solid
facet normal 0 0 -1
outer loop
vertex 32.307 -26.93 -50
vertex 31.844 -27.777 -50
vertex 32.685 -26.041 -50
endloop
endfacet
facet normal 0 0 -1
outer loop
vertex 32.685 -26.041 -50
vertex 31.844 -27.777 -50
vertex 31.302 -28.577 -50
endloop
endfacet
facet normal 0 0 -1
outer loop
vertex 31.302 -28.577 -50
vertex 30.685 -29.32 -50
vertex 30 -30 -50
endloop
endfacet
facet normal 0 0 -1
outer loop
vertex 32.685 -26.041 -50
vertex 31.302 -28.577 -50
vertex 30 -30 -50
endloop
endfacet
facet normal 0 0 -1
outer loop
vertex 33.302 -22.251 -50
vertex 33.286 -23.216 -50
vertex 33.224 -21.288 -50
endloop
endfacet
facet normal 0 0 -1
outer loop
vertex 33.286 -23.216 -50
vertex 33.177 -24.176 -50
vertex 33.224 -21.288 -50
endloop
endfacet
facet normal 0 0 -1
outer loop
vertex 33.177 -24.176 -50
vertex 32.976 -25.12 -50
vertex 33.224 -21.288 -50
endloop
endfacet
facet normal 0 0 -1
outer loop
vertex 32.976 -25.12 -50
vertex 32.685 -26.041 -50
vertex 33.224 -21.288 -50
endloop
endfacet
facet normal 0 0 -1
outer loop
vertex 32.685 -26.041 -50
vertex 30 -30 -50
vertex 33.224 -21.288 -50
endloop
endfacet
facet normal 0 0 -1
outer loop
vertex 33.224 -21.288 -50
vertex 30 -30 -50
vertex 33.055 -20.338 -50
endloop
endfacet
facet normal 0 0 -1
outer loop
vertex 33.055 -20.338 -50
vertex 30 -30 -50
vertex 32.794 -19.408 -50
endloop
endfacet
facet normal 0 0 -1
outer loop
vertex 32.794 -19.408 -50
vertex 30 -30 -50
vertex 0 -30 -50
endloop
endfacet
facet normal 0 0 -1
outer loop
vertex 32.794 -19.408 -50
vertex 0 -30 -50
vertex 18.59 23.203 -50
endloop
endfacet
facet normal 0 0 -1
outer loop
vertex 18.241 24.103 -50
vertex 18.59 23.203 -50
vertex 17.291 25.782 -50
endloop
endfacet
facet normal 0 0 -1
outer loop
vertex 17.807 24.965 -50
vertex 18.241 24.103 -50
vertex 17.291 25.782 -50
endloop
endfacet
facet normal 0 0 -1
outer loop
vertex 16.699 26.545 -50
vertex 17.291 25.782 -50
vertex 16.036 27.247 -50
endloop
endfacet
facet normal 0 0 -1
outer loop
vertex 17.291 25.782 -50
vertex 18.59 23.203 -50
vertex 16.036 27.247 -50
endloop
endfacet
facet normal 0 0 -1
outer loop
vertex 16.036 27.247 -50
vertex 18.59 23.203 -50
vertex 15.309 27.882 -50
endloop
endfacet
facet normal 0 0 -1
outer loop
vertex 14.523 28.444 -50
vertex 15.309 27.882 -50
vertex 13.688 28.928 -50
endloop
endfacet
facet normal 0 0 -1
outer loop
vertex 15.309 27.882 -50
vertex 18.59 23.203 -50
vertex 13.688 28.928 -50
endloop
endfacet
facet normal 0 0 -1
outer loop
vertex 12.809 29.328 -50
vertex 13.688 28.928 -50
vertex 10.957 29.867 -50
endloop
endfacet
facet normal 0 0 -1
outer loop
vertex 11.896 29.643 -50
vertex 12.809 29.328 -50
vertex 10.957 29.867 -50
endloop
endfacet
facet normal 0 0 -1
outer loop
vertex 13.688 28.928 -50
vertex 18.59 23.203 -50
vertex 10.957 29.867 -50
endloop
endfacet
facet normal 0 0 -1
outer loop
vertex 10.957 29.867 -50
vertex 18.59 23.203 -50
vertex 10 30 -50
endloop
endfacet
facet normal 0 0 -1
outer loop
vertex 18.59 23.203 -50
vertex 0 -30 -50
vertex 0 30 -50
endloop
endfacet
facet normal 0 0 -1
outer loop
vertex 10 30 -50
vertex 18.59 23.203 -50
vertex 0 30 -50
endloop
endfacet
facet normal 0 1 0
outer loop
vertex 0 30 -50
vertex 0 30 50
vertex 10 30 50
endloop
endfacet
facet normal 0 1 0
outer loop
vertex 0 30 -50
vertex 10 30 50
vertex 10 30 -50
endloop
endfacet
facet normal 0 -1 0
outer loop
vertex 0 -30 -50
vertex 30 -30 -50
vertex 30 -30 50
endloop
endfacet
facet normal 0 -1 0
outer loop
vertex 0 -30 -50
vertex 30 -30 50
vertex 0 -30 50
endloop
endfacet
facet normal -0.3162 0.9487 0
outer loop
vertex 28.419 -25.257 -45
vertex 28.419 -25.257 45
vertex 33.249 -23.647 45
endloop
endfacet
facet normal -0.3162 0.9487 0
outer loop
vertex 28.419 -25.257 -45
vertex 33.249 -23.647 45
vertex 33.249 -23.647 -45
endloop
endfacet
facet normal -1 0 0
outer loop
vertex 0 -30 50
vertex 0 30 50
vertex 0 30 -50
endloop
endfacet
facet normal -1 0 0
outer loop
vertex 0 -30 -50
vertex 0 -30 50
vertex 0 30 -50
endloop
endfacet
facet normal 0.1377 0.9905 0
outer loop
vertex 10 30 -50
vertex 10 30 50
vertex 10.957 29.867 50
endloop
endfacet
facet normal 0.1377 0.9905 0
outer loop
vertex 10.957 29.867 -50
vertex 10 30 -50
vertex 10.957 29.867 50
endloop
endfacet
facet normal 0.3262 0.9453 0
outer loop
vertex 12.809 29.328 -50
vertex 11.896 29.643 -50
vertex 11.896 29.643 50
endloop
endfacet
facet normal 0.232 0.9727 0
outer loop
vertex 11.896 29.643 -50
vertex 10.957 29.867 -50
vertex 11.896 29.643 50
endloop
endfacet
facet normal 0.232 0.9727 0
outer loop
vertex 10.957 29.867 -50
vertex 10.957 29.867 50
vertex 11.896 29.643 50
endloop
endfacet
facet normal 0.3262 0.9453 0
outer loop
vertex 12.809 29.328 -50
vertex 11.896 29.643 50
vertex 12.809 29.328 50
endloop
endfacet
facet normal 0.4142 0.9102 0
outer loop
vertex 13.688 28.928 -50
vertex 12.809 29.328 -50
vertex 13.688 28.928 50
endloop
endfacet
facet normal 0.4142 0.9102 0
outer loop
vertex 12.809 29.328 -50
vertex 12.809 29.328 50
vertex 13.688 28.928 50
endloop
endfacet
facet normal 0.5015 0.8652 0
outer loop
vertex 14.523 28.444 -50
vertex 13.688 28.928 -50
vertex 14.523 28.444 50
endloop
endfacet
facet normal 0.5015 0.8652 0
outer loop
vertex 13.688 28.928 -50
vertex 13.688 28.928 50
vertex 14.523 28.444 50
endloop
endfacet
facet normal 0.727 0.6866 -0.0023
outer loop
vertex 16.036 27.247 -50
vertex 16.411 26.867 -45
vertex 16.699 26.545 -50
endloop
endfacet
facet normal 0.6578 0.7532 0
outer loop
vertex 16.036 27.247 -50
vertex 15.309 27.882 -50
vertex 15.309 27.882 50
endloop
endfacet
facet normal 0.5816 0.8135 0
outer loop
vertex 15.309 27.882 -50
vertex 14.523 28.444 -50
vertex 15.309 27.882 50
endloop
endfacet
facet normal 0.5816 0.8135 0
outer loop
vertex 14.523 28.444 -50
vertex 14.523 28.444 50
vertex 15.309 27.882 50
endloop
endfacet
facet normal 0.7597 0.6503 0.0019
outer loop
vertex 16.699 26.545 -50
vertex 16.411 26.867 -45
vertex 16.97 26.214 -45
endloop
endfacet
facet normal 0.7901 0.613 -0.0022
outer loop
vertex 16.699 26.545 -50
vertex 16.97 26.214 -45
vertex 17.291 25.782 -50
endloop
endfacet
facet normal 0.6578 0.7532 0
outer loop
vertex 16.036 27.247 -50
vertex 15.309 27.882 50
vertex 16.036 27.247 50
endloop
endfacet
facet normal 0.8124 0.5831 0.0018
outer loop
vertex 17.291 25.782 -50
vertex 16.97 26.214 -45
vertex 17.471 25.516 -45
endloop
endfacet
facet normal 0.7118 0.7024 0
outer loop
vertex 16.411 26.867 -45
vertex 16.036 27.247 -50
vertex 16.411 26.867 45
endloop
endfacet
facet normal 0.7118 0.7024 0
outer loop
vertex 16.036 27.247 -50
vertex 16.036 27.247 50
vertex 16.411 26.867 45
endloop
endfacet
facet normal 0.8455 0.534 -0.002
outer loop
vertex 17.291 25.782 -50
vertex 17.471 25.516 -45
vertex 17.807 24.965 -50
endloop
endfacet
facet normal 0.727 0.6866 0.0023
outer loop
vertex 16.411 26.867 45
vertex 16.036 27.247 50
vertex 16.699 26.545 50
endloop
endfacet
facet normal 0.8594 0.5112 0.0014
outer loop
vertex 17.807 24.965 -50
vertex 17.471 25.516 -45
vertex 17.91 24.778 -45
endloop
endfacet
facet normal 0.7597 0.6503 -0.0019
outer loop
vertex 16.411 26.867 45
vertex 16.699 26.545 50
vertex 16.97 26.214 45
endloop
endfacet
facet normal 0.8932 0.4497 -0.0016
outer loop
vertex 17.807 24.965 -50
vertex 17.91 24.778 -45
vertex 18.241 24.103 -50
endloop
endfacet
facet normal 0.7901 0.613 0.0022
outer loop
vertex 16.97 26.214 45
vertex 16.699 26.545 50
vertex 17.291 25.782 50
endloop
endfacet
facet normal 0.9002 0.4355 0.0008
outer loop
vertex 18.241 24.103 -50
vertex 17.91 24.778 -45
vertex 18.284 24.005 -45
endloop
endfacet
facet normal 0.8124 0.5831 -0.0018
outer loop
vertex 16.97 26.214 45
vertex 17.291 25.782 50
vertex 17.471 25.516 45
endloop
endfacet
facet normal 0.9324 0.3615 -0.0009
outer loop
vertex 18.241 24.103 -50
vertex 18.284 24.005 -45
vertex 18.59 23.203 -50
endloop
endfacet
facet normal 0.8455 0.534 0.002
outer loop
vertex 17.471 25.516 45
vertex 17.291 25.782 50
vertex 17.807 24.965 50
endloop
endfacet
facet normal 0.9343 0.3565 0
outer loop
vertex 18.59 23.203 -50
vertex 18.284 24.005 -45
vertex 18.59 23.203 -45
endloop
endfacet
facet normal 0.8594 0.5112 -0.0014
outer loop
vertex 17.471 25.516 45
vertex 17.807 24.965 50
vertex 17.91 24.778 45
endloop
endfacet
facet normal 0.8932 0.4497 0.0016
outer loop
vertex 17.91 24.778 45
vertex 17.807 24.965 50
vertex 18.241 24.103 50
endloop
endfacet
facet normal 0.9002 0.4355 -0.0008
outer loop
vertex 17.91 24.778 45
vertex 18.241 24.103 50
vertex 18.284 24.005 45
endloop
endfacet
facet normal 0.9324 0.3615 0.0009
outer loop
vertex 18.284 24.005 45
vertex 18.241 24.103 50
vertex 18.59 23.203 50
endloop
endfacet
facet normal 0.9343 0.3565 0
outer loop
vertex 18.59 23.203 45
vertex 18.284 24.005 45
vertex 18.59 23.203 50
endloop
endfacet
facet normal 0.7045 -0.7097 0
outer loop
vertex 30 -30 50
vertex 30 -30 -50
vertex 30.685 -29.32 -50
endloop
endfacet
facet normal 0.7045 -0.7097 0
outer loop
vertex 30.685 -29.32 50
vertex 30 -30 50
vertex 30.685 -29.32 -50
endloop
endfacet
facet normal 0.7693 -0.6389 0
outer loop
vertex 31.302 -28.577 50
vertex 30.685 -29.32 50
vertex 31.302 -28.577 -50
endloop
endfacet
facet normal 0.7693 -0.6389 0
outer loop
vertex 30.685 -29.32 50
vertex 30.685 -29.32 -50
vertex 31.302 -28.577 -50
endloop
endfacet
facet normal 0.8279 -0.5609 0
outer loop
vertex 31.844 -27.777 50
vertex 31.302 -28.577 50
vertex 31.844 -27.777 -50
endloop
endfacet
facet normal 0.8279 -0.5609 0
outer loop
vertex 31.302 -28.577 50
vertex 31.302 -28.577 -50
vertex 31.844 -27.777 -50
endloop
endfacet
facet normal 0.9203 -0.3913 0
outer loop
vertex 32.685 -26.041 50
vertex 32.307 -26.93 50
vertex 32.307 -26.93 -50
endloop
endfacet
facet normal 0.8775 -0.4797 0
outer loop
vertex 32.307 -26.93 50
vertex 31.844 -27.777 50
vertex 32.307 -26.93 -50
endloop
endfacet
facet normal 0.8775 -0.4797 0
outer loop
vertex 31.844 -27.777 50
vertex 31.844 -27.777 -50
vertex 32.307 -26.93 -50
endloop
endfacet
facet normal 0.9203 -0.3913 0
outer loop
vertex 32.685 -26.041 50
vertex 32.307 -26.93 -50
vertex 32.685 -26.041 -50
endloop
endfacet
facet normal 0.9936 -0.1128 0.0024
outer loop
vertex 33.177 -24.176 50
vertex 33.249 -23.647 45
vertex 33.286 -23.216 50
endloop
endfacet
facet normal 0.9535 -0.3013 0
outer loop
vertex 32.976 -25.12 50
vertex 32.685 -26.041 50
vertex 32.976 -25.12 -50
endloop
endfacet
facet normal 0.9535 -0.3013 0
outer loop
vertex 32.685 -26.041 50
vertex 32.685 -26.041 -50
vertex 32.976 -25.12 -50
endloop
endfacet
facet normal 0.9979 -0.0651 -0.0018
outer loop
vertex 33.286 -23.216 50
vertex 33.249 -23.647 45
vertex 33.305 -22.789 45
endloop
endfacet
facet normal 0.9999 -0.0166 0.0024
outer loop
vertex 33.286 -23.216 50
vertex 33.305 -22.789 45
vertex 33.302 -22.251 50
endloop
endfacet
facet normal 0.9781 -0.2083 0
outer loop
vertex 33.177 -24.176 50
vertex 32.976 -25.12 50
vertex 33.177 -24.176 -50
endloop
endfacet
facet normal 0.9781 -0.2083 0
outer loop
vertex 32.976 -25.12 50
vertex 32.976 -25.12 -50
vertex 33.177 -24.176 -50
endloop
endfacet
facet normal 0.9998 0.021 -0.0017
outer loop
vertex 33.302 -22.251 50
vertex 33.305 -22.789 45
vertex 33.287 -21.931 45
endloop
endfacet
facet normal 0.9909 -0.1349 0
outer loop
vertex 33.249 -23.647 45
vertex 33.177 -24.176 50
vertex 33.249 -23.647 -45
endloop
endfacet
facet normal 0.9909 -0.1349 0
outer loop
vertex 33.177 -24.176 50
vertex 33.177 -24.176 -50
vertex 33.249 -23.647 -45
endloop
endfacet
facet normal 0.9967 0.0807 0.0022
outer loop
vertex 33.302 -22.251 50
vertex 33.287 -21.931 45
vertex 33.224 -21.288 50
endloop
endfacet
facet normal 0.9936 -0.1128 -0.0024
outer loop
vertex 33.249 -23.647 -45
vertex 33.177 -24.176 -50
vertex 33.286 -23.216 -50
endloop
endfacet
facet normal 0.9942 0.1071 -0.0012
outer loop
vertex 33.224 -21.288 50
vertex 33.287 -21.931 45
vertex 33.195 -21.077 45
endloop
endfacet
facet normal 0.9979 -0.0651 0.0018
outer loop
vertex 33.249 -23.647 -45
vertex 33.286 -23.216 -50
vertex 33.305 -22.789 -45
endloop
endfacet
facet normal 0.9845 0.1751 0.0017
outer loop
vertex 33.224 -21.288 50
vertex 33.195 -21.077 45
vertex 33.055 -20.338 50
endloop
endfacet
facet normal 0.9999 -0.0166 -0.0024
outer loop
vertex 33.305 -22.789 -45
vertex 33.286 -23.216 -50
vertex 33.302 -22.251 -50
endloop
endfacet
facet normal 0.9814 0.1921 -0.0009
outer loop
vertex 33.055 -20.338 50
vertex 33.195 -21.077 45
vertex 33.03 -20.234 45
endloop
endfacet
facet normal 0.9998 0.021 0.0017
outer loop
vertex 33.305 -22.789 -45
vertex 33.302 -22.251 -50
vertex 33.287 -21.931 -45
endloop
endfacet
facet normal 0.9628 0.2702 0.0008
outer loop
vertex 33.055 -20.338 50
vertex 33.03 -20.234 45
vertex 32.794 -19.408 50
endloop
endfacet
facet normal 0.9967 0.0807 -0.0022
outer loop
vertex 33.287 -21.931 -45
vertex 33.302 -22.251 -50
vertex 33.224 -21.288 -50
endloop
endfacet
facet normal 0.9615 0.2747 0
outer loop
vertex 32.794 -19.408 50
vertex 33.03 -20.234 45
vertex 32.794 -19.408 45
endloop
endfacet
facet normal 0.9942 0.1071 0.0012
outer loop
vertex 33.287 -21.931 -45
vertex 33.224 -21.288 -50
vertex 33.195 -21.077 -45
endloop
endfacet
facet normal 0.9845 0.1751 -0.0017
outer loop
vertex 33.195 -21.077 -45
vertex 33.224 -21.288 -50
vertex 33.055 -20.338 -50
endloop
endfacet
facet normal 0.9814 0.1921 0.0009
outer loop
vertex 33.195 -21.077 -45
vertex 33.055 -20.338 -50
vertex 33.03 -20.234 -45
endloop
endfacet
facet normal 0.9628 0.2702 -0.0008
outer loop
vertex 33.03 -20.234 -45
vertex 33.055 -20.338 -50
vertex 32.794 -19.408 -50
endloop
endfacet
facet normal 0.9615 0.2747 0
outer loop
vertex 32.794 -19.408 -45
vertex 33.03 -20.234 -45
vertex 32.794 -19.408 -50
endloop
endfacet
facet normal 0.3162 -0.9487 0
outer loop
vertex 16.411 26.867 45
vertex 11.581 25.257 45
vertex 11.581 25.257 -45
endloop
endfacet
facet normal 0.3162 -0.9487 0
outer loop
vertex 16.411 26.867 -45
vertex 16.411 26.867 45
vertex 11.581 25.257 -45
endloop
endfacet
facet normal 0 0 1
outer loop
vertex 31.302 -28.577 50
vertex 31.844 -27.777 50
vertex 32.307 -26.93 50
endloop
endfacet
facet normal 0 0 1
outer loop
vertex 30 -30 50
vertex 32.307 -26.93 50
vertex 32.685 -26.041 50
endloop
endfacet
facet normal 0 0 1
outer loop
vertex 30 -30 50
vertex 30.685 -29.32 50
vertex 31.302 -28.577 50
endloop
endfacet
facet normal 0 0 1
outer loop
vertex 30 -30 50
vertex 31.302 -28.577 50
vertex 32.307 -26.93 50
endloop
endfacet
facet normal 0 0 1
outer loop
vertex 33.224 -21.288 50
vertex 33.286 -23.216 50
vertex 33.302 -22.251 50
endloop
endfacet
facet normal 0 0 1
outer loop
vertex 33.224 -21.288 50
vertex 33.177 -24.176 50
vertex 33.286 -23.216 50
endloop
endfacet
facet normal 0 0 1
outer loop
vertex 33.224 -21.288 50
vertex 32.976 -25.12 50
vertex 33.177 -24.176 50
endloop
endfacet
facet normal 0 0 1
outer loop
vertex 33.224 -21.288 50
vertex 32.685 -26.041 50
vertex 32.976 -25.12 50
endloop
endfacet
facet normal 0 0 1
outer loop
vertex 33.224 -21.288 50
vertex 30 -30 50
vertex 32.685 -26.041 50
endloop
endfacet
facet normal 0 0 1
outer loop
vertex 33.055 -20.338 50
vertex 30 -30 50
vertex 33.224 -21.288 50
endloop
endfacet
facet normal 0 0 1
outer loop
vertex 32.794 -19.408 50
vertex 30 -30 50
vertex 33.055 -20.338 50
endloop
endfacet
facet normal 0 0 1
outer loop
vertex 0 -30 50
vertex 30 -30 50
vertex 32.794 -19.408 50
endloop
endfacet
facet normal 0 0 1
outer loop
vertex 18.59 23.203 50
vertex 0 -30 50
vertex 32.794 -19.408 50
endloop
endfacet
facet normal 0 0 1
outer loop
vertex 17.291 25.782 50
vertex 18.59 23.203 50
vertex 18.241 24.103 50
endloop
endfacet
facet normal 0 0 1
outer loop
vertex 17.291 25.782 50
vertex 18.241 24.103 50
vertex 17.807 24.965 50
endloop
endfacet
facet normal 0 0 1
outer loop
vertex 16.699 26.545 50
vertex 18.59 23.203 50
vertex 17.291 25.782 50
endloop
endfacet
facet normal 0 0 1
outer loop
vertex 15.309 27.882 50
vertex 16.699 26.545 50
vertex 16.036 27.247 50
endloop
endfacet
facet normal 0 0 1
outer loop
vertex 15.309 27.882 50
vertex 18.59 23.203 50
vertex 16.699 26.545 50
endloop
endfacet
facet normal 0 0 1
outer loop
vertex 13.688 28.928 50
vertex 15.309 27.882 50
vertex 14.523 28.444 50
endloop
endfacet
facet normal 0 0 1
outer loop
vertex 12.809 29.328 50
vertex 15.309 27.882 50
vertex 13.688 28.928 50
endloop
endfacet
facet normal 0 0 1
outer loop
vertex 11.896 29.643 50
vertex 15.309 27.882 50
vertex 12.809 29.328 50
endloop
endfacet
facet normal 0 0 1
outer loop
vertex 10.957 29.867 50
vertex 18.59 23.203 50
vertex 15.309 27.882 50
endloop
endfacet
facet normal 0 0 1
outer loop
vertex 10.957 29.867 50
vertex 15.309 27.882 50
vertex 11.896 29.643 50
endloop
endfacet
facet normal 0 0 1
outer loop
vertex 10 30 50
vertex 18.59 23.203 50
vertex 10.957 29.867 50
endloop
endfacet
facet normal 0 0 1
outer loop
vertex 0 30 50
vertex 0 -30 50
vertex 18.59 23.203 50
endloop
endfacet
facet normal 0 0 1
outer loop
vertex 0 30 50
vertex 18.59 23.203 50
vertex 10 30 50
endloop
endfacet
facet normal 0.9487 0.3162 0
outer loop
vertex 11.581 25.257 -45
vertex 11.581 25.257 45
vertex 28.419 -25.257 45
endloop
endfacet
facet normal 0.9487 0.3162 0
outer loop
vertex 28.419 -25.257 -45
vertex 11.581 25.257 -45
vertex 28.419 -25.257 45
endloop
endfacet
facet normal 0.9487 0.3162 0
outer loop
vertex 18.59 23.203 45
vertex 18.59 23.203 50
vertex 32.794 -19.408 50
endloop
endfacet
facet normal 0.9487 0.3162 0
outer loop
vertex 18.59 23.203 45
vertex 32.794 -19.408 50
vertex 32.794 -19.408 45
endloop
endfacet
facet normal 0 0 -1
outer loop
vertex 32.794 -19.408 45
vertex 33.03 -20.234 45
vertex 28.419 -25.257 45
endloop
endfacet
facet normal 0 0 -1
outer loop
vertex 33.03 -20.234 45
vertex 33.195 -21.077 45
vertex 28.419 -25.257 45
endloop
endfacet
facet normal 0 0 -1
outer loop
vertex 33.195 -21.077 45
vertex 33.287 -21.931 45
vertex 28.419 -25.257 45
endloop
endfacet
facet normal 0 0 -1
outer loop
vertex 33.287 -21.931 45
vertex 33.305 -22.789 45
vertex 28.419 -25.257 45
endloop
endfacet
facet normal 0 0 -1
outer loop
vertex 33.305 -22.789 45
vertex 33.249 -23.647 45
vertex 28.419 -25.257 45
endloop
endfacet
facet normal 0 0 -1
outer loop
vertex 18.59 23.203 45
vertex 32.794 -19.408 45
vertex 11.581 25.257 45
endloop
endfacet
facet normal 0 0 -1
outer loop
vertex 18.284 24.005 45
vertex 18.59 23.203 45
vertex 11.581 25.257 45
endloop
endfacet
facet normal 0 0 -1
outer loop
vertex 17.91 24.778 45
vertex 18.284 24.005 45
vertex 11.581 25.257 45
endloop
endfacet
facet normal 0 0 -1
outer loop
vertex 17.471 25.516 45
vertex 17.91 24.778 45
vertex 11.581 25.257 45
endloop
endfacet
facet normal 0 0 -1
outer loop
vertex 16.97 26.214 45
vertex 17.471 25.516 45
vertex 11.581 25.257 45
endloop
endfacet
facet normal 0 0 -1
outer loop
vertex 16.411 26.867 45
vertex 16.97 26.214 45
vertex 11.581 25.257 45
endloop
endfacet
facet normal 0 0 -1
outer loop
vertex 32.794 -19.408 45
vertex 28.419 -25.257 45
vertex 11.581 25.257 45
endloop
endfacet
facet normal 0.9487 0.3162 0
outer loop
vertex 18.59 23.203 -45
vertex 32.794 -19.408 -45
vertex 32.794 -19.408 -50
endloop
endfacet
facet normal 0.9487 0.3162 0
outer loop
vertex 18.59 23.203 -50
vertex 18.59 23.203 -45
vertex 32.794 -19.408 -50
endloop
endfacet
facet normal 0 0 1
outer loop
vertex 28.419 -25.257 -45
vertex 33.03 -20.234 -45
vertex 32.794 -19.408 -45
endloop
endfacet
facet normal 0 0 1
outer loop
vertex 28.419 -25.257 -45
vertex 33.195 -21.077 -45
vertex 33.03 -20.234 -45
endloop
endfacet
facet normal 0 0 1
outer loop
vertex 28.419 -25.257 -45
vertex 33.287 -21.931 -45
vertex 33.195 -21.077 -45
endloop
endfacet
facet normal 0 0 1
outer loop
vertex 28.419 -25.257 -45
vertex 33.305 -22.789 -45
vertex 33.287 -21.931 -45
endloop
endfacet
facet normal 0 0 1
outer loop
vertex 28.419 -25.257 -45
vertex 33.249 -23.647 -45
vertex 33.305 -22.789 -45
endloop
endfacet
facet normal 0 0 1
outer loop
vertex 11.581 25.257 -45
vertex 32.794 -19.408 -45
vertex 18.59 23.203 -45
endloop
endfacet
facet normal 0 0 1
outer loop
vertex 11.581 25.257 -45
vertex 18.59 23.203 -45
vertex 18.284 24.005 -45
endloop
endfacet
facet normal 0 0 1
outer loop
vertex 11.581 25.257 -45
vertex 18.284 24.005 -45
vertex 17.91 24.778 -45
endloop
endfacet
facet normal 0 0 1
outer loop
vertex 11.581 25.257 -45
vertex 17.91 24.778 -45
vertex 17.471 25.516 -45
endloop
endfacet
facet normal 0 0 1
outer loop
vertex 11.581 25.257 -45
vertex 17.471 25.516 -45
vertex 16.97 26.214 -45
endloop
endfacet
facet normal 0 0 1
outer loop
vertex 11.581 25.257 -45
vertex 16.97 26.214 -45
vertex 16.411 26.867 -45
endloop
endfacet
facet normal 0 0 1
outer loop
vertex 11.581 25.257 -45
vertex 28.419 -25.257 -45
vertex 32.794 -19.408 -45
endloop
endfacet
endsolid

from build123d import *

# Parameters (mm, degrees)
SKETCH1_W           = 100
SKETCH1_H           = 60
BOSS_EXTRUDE1_DEPTH = 10
BOSS_EXTRUDE2_DEPTH = 100
SKETCH3_W           = 100
SKETCH3_H           = 63.245553203
SKETCH3_W_2         = 90
SKETCH3_H_2         = 53.245553203
BOSS_EXTRUDE3_DEPTH = 6
FILLET1_R           = 10
FILLET3_R           = 10


with BuildPart() as part:
    # Sketch1 → Boss-Extrude1 (new body)
    with BuildSketch(Plane(origin=(0, 0, 0), x_dir=(0, 0, -1), z_dir=(1, 0, 0))):
        Rectangle(SKETCH1_W, SKETCH1_H)
    extrude(amount=BOSS_EXTRUDE1_DEPTH)

    # Sketch2 → Boss-Extrude2 (add)
    with BuildSketch(Plane.XY.offset(50)):
        Polygon((10, 30), (30, -30), (10, -30), align=None)
    extrude(amount=-BOSS_EXTRUDE2_DEPTH)

    # Sketch3 → Boss-Extrude3 (add)
    with BuildSketch(Plane(origin=(18, 6, 0), x_dir=(0, 0, -1), z_dir=(0.9486832980505139, 0.316227766016838, 0))):
        with Locations((0, -6.324555321)):
            Rectangle(SKETCH3_W, SKETCH3_H)
        with Locations((0, -6.324555321)):
            Rectangle(SKETCH3_W_2, SKETCH3_H_2, mode=Mode.SUBTRACT)
    extrude(amount=BOSS_EXTRUDE3_DEPTH)

    # Fillet1
    # the kernel refuses this fillet: 10 mm, written as the material it takes off along each edge
    with BuildSketch(Plane(origin=(15.692099788, 31.897366596, 72.912878475), x_dir=(0.31622776601683805, -0.9486832980505137, 0), z_dir=(0, 0, -1))) as fillet1_piece_1:
        with BuildLine():
            CenterArc((9.16515139, 10), FILLET1_R, 203.578178478, 66.421821522)
            Line((0, 6), (0, 0))
            Line((0, 0), (9.16515139, 0))
        make_face()
    extrude(amount=145.82575695, mode=Mode.SUBTRACT)

    # Fillet3
    # the kernel refuses this fillet: 10 mm, written as the material it takes off along each edge
    with BuildSketch(Plane(origin=(35.692099788, -28.102633404, -72.912878475), x_dir=(-0.9486832980505142, -0.3162277660168365, 0), z_dir=(0, 0, 1))) as fillet3_piece_1:
        with BuildLine():
            CenterArc((10, -9.16515139), FILLET3_R, 113.578178478, 66.421821522)
            Line((0, -9.16515139), (-0.2, -9.16515139))
            Line((-0.2, -9.16515139), (-0.2, 0))
            Line((-0.2, 0), (0, 0.2))
            ThreePointArc((0, 0.2), (3, 0.2), (5.92, 0.183303028))
            Line((5.92, 0.183303028), (6, 0))
        make_face()
    extrude(amount=145.82575695, mode=Mode.SUBTRACT)


solid = part.part
